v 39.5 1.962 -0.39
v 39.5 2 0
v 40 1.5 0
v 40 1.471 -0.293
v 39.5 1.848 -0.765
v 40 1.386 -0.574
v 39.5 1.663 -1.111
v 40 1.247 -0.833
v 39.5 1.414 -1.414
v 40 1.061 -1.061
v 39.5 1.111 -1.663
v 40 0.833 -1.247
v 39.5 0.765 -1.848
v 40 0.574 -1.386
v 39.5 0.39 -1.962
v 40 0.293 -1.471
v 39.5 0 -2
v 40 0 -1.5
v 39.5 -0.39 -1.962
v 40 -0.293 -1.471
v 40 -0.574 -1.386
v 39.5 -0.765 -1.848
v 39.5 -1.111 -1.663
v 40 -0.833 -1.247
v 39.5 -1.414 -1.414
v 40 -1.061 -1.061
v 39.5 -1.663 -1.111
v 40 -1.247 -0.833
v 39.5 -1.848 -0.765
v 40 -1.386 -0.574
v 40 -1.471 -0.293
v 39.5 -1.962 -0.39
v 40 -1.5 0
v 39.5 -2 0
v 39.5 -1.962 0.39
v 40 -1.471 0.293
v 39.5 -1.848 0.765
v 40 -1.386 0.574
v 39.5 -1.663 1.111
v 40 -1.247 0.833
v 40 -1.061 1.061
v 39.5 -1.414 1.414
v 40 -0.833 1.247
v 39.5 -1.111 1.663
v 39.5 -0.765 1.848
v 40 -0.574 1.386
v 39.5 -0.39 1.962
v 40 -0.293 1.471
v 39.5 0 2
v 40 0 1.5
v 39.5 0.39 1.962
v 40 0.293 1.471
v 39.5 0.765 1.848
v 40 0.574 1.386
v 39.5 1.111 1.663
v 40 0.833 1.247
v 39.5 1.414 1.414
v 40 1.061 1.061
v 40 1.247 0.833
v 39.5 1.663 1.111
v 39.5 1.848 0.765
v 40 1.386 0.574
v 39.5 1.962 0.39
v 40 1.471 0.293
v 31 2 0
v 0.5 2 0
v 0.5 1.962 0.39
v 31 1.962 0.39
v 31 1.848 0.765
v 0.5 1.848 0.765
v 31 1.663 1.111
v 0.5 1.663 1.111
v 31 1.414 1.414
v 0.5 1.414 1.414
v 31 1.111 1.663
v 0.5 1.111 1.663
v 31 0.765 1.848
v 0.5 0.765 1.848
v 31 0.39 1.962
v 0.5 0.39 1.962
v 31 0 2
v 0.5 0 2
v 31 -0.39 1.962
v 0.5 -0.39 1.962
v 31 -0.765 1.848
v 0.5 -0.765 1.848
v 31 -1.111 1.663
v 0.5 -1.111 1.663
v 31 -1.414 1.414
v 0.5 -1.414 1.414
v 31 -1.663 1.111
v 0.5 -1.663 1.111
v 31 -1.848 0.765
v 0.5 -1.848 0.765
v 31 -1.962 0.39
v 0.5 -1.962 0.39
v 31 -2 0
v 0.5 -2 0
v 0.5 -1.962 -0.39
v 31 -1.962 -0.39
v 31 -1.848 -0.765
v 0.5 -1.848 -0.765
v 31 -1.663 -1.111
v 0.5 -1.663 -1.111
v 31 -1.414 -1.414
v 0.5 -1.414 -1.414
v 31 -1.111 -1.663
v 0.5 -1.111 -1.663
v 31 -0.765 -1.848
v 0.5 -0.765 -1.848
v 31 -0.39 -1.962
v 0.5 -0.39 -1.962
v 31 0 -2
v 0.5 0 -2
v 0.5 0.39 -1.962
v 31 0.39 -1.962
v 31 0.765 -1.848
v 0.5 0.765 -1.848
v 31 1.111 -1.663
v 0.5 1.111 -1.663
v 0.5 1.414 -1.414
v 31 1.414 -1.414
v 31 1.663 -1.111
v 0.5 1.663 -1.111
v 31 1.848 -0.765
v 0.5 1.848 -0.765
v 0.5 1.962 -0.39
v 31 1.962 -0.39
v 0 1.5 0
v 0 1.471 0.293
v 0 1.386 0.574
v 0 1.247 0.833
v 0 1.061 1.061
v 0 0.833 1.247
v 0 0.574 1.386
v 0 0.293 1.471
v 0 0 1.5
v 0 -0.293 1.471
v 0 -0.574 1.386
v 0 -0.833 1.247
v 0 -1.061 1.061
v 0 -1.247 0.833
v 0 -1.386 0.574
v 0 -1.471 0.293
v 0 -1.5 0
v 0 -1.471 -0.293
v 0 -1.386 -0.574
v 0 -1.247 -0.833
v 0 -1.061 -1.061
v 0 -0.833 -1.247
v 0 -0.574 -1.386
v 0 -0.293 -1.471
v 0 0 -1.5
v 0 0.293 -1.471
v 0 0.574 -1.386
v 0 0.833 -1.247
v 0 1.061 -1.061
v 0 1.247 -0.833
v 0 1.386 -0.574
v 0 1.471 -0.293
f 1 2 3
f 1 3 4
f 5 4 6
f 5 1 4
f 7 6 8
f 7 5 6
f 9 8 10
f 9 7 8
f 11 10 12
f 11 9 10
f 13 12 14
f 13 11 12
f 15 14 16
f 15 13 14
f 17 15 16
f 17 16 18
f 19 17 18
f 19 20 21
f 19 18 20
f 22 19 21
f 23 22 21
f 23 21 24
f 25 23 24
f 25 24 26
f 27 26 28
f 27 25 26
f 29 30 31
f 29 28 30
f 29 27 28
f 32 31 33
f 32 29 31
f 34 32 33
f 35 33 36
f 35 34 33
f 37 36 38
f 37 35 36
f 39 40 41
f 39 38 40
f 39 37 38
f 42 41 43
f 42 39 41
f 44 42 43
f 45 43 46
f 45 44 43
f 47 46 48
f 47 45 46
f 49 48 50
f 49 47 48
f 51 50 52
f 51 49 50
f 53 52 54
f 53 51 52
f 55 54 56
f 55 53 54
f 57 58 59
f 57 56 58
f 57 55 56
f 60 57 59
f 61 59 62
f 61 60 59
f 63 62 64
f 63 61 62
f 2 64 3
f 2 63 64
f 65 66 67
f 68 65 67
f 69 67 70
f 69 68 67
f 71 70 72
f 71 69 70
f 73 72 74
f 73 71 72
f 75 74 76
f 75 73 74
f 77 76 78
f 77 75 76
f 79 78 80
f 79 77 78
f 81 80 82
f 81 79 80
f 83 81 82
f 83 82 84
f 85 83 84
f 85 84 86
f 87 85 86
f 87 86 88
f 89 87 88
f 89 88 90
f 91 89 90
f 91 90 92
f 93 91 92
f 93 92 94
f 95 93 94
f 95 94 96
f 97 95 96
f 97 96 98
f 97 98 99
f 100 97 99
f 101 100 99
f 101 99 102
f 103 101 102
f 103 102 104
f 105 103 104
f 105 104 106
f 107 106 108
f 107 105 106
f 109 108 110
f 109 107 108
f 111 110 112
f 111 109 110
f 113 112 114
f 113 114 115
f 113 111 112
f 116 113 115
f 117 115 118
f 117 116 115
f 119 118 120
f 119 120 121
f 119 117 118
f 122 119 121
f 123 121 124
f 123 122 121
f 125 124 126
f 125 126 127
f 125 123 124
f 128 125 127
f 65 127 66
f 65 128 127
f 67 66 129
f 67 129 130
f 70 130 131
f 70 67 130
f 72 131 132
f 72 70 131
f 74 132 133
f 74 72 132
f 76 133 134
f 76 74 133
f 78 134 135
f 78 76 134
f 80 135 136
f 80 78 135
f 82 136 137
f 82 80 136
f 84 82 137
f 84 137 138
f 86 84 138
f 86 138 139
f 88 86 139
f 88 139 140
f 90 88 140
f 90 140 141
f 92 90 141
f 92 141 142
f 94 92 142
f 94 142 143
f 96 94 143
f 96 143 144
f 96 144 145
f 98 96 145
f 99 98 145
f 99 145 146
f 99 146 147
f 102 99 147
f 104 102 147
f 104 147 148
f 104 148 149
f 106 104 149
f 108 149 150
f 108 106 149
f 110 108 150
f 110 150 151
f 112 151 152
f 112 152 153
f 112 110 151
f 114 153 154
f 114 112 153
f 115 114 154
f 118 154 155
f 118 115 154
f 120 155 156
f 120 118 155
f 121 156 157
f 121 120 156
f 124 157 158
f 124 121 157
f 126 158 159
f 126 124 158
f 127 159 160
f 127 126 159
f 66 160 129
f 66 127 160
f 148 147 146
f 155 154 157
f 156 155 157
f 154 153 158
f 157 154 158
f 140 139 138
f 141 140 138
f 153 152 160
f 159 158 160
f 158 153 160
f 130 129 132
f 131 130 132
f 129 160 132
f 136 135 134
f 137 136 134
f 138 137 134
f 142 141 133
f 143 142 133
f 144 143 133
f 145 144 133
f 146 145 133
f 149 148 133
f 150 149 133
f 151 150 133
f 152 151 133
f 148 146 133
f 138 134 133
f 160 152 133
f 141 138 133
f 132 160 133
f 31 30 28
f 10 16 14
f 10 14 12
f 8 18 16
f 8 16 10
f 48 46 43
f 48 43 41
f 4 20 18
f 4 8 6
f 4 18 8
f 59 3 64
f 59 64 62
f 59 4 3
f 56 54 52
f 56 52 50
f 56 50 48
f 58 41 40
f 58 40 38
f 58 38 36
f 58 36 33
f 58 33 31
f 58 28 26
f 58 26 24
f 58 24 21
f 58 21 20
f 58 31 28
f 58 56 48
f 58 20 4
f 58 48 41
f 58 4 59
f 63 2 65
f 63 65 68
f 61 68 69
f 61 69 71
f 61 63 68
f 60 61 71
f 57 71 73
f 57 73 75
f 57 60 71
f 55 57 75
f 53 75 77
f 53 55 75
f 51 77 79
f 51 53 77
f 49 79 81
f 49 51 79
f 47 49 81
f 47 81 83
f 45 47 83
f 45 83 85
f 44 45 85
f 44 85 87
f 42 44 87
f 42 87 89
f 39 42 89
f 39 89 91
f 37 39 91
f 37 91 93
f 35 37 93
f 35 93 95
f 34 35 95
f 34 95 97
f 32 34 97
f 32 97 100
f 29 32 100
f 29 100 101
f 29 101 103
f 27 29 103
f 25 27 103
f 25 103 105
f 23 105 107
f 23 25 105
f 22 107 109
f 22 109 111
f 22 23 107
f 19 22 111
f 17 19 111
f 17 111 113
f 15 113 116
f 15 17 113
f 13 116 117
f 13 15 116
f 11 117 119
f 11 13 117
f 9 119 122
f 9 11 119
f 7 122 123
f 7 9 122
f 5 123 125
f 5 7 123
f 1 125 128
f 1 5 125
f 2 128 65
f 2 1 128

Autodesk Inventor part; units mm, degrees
ref_plane "Startebene" through (0, 0, 0) normal (1, 0, 0) x (0, 1, 0)
ref_plane "XZ Plane" through (0, 0, 0) normal (0, 1, 0) x (-1, 0, 0)
ref_plane "XY Plane" through (0, 0, 0) normal (0, 0, 1) x (1, 0, 0)
sketch "Hauptskizze" plane through (0, 0, 0) normal (0, 0, 1) x (1, 0, 0)
  line L0 (0, 0) -> (40, 0)
  line L1 (0, 0) -> (0, 2)
  line L2 (0, 2) -> (31, 2)
  line L3 (40, 2) -> (40, 0)
  line L4 (31, 2) -> (40, 2)
  dimension "d3" = 4
  dimension "d5" = 4
revolve "Umdrehung1" add sketch "Hauptskizze" angle 360 about axis through (0, 0, 0) along (1, 0, 0)
chamfer "Fase1" distance 0.5 angle 45 1 edges at (0, -2, 0) measured on face at (10.3333, 1.9935, -0.1609)
chamfer "Fase2" distance 0.5 angle 45 1 edges at (40, -2, 0) measured on face at (34, 1.9935, -0.1609)
properties part number "Welle" material "Steel"
